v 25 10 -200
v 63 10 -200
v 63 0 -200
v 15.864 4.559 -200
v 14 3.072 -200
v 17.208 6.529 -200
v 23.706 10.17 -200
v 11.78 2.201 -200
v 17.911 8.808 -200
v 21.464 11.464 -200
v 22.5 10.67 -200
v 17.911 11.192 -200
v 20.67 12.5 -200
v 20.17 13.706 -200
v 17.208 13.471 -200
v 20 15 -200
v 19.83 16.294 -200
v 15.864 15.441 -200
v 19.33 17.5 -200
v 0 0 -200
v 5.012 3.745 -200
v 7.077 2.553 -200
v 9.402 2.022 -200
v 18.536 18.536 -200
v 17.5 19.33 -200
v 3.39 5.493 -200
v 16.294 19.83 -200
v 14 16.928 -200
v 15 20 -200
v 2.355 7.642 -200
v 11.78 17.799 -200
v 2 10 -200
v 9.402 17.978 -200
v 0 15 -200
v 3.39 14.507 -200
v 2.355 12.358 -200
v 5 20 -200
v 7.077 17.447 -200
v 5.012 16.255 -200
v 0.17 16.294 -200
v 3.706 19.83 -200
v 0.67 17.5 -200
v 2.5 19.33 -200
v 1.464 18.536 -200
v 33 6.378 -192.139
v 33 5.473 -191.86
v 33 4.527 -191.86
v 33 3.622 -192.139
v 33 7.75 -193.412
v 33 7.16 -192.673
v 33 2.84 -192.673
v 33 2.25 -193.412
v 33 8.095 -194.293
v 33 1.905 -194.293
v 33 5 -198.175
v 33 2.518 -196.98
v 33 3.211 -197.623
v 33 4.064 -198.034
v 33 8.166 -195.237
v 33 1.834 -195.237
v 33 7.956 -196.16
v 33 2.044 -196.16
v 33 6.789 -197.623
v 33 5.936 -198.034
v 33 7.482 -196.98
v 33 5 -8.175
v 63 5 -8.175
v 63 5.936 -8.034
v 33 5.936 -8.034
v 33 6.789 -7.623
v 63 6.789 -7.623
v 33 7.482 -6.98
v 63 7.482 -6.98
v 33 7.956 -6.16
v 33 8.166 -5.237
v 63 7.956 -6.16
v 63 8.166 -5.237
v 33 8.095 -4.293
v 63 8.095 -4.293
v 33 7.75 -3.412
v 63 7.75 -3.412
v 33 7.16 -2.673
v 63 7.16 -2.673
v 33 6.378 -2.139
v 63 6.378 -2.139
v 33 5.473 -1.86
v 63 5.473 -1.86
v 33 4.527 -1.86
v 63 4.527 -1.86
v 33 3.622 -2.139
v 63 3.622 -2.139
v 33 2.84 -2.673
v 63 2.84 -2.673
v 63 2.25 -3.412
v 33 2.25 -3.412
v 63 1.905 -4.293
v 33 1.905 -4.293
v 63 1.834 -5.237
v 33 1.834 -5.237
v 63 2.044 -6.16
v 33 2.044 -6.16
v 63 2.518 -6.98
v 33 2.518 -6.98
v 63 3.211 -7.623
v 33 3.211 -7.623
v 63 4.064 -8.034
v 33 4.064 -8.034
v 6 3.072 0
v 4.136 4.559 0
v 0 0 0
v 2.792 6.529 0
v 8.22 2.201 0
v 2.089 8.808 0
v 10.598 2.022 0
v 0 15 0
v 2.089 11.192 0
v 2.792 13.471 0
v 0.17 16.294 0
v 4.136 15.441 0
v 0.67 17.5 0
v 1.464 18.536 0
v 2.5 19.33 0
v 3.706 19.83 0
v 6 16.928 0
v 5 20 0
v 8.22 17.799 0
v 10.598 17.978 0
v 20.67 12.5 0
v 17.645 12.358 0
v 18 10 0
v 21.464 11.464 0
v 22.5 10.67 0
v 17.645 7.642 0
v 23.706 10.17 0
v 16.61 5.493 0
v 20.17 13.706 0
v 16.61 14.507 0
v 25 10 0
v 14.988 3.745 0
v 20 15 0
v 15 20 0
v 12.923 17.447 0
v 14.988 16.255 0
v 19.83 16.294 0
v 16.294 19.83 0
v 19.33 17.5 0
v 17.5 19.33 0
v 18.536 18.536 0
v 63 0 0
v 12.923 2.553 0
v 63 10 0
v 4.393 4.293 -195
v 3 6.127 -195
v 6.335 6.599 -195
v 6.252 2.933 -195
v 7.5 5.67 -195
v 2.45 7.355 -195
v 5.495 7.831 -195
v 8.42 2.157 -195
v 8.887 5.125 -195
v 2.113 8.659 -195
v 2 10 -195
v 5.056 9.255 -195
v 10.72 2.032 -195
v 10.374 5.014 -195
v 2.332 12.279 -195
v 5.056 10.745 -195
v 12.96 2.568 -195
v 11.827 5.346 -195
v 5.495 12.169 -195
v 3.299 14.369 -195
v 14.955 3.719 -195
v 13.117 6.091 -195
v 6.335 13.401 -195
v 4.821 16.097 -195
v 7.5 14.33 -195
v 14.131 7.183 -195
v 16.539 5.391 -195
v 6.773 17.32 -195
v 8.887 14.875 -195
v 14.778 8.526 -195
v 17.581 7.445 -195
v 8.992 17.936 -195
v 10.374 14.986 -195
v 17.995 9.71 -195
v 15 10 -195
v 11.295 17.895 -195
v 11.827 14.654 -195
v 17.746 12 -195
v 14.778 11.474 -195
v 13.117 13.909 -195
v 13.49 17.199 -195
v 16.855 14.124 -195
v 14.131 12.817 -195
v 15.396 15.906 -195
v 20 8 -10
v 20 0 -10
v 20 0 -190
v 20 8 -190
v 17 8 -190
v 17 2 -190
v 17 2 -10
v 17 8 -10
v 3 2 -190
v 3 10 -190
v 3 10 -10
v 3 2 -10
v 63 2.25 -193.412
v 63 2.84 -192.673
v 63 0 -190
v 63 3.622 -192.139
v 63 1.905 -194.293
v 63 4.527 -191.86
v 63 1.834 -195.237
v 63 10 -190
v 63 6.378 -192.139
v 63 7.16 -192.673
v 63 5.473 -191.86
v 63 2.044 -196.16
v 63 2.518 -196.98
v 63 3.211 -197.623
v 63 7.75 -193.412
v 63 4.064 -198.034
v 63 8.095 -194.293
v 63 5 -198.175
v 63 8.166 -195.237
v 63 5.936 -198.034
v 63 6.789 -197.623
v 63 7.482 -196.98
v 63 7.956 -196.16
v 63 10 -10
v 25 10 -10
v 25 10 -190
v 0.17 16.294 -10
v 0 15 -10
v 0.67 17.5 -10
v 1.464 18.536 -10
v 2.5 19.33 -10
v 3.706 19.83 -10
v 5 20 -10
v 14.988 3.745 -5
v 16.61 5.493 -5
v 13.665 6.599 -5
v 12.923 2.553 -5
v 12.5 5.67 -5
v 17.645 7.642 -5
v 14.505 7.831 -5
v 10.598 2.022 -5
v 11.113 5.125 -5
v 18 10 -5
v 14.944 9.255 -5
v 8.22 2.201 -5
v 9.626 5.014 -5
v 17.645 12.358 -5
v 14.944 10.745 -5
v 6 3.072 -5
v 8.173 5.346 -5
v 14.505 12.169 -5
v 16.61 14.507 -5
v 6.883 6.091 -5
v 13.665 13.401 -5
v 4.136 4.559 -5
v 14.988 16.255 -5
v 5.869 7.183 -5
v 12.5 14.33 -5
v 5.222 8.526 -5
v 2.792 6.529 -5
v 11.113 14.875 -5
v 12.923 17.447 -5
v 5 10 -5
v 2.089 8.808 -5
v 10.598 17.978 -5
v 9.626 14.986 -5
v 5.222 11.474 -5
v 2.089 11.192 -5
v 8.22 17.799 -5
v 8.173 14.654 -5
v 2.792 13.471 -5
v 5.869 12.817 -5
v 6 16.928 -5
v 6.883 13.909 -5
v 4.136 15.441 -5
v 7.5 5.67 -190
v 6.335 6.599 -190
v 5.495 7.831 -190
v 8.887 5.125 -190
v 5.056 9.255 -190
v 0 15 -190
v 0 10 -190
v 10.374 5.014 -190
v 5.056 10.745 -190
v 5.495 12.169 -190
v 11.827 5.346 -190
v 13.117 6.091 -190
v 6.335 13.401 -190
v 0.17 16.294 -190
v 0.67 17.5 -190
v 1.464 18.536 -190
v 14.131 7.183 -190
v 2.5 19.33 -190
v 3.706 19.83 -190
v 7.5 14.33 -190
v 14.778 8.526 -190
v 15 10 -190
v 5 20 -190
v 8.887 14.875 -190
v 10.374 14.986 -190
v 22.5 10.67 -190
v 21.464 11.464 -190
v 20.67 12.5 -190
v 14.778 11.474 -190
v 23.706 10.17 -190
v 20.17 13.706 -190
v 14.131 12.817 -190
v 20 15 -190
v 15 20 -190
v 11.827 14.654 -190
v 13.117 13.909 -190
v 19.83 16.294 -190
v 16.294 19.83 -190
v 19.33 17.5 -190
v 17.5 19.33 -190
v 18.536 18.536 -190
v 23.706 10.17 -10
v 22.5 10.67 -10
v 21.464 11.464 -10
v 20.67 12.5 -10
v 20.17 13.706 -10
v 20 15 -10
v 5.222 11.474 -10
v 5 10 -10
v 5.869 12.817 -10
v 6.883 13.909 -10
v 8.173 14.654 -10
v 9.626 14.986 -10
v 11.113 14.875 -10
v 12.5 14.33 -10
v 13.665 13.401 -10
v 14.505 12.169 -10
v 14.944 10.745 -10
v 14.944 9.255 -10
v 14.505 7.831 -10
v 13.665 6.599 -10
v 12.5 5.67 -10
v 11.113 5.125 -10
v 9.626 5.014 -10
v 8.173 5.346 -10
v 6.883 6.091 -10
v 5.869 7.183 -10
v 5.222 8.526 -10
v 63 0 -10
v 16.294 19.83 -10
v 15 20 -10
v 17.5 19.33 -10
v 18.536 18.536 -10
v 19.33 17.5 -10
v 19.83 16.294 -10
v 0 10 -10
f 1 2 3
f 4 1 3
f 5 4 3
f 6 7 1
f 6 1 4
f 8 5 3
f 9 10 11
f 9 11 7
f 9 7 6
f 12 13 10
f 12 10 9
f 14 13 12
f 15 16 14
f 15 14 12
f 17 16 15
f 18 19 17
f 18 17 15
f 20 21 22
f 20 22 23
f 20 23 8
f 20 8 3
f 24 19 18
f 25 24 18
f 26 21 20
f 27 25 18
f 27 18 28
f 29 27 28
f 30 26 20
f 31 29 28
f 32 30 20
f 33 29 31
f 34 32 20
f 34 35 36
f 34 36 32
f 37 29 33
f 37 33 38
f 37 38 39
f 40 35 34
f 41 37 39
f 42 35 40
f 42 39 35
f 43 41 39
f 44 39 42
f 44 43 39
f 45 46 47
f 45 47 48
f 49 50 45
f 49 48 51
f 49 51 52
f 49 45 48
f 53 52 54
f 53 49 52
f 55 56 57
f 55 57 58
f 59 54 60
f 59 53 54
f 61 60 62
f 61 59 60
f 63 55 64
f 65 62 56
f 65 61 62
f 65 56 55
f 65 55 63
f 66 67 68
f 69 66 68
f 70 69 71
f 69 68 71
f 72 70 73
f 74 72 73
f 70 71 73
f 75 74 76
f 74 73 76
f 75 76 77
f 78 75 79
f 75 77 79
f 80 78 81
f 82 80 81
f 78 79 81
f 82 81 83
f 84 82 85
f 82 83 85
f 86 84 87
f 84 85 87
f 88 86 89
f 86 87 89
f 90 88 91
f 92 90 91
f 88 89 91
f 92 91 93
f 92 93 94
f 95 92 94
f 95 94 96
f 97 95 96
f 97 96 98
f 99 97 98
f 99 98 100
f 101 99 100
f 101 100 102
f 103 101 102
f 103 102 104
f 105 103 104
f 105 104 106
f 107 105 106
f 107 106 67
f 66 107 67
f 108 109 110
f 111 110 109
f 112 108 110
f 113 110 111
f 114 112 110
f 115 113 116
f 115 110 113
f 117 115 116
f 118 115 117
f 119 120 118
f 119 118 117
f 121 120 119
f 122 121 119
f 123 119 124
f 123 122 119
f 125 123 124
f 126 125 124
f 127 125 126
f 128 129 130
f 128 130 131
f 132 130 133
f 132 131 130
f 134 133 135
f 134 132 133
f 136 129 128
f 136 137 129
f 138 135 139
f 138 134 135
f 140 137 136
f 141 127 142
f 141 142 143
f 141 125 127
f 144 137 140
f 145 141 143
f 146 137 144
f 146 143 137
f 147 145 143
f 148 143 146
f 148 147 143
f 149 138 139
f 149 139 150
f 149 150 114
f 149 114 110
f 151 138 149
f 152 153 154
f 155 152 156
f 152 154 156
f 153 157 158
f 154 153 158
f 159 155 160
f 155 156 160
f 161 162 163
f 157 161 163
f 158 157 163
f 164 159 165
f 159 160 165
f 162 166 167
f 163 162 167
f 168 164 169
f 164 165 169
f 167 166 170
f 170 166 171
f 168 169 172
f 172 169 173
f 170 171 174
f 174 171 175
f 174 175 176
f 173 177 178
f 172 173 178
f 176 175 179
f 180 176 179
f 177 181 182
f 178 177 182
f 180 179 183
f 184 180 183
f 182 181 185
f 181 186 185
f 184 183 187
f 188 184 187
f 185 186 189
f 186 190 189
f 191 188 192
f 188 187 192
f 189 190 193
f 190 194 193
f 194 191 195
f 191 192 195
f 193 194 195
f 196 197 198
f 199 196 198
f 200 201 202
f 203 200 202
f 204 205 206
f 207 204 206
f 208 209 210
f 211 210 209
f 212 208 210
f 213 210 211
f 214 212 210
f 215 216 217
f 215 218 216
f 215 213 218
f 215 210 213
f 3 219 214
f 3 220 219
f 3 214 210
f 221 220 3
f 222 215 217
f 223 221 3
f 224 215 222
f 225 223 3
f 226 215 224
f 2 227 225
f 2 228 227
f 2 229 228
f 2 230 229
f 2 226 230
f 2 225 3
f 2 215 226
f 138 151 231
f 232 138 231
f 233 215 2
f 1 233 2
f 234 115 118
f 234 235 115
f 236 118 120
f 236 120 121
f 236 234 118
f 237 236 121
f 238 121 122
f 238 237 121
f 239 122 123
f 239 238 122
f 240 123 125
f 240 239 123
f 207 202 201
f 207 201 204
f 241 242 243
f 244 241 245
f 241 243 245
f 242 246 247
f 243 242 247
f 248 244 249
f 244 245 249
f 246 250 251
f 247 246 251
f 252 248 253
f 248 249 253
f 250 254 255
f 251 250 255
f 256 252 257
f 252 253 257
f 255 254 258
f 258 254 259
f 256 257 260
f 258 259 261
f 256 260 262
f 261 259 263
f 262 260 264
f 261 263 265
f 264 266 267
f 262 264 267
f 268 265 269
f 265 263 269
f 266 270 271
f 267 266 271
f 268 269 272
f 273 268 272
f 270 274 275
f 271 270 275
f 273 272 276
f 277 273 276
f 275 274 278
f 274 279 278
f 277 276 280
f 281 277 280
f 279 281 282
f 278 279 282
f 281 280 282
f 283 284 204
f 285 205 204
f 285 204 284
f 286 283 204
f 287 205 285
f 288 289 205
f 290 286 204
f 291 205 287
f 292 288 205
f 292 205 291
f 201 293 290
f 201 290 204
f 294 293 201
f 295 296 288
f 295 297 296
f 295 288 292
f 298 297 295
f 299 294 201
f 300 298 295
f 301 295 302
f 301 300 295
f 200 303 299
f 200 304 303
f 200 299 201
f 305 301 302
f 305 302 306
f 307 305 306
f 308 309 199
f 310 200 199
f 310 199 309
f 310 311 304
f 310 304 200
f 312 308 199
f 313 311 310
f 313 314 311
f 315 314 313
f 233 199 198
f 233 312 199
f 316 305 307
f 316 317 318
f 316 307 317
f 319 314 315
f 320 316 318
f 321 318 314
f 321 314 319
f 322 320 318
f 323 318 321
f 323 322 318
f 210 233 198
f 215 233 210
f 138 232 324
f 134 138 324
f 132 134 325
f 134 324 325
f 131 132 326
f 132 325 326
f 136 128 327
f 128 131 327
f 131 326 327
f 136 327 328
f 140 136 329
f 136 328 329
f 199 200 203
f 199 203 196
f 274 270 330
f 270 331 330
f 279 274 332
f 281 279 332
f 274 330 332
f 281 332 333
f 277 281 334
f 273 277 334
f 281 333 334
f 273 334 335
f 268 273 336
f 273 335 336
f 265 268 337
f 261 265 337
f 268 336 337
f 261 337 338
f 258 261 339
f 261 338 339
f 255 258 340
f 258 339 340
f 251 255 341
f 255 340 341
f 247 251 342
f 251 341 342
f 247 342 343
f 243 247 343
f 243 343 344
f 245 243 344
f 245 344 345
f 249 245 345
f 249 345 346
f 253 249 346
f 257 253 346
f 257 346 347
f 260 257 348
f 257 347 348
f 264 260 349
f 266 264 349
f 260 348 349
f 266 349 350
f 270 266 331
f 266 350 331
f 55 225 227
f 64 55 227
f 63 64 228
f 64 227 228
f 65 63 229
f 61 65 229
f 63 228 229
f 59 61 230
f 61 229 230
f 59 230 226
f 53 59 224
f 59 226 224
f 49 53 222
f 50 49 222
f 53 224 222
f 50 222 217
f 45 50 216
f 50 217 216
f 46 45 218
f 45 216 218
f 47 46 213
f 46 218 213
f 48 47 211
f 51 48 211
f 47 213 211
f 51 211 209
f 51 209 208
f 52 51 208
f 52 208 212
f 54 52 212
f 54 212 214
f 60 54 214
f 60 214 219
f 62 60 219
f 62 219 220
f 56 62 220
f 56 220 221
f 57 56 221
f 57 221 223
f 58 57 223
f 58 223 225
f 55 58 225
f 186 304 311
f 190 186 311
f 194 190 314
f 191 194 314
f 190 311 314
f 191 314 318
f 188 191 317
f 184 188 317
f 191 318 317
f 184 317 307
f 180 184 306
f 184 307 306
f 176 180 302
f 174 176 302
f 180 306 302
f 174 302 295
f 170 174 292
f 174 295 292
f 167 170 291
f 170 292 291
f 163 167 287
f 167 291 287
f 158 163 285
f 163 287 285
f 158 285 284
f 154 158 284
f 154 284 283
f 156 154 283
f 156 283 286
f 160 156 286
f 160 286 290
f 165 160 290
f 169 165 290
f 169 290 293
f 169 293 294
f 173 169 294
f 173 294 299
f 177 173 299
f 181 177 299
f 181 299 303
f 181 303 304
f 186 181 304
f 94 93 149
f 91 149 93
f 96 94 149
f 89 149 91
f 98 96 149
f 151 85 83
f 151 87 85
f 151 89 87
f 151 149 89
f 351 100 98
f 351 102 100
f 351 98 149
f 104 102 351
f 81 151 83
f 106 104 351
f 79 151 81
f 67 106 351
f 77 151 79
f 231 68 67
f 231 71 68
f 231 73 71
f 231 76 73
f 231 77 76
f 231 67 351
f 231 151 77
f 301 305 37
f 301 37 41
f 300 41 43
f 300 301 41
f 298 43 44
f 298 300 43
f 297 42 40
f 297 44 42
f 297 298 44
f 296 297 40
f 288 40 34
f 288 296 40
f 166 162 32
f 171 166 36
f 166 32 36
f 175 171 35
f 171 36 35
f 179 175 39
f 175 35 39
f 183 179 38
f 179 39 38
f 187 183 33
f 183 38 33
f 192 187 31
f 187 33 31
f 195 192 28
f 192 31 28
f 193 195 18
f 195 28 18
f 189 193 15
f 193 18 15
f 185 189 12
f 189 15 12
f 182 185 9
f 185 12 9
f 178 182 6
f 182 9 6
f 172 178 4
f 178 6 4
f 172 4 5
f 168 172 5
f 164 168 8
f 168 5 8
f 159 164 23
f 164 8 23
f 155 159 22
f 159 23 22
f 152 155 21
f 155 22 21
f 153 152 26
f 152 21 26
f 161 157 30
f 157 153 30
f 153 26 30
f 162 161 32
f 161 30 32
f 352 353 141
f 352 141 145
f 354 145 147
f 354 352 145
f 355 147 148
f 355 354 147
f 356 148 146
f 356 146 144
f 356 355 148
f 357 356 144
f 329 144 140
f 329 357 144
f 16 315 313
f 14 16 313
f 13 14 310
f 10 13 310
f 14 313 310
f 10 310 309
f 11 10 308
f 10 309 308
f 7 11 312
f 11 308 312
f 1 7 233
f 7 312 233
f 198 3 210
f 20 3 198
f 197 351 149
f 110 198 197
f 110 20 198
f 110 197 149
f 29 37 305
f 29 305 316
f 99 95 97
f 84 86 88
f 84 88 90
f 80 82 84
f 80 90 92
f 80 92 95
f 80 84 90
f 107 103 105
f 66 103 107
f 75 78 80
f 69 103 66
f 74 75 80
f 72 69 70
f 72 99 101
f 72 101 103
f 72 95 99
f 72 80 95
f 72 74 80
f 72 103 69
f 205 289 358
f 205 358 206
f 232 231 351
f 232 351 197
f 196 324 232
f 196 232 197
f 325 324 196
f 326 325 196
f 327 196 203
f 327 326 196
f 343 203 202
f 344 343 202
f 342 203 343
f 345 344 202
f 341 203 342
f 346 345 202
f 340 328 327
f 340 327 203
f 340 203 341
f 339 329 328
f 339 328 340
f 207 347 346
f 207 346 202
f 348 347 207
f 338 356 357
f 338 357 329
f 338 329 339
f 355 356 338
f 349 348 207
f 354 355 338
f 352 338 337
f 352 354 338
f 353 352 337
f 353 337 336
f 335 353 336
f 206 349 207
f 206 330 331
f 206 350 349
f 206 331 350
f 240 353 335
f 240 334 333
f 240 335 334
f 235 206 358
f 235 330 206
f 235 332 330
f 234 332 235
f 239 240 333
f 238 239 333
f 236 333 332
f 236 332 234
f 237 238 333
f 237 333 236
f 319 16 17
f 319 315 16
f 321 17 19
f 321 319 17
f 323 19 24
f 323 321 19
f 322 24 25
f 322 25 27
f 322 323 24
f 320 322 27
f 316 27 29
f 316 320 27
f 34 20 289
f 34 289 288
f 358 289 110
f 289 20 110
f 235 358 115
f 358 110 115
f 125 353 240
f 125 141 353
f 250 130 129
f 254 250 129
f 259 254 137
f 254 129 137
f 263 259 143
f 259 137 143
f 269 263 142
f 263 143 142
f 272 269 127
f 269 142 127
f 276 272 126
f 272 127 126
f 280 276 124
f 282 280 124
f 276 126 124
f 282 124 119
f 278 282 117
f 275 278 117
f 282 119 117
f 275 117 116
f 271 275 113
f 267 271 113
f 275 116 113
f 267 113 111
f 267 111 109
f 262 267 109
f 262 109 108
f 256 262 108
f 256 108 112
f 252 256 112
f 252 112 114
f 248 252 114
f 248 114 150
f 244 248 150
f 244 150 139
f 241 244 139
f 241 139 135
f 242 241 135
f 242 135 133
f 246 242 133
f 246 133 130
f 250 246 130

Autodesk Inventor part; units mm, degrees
ref_plane "YZ Plane" through (0, 0, 0) normal (1, 0, 0) x (0, 1, 0)
ref_plane "XZ Plane" through (0, 0, 0) normal (0, 1, 0) x (-1, 0, 0)
ref_plane "XY Plane" through (0, 0, 0) normal (0, 0, 1) x (1, 0, 0)
sketch "Sketch1" plane through (0, 0, 0) normal (1, 0, 0) x (0, 1, 0)
  line L0 (0, 0) -> (10, 0)
  line L1 (10, 0) -> (10, -200)
  line L2 (10, -200) -> (0, -200)
  line L3 (0, -200) -> (0, 0)
  dimension "d0" = 10
  dimension "d1" = 200
extrude "Extrusion1" add sketch "Sketch1" along normal blind 3
sketch "Sketch2" plane through (3, 0, 0) normal (1, 0, 0) x (0, 0, -1)
  line L0 (0, 10) -> (0, 0) projected
  line L1 (0, 0) -> (200, 0) projected
  line L2 (0, 10) -> (10, 10)
  line L3 (10, 10) -> (10, 0)
  line L4 (10, 0) -> (0, 0)
  line L5 (0, 0) -> (0, 10)
  line L6 (200, 0) -> (200, 10) projected
  line L7 (200, 10) -> (190, 10)
  line L8 (190, 10) -> (190, 0)
  line L9 (190, 0) -> (200, 0)
  line L10 (200, 0) -> (200, 10)
  dimension "d4" = 10
  dimension "d5" = 10
extrude "Extrusion2" add sketch "Sketch2" along normal blind 60
sketch "Sketch3" plane through (63, 0, 0) normal (1, 0, 0) x (0, 0, -1)
  line L0 (0, 10) -> (200, 10) construction
  line L1 (10, 0) -> (190, 0) construction
  line L2 (0, 10) -> (10, 0) construction
  line L3 (5, 5) -> (0, 5) construction
  line L4 (0, 0) -> (0, 10) construction
  circle A0 centre (5, 5) radius 3.175
  line L5 (200, 10) -> (190, 10) construction
  line L6 (200, 0) -> (200, 10) construction
  line L7 (190, 10) -> (200, 0) construction
  circle A1 centre (195, 5) radius 3.175
  dimension "d8" = 6.35
  dimension "d9" = 6.35
extrude "Extrusion3" cut sketch "Sketch3" against normal blind 30
sketch "Sketch4" plane through (0, 0, -200) normal (0, 0, -1) x (-1, 0, 0)
  line L0 (0, 0) -> (-63, 0) construction
  line L1 (0, 0) -> (-20, 0) construction
  line L2 (-20, 0) -> (-20, 20) construction
  line L3 (-20, 20) -> (0, 20) construction
  line L4 (0, 20) -> (0, 0) construction
  line L5 (-3, 10) -> (-63, 10) construction
  circle A0 centre (-10, 10) radius 8 construction
  line L6 (0, 10) -> (-63, 10) projected
  arc A1 (-2, 10) -> (-18, 10) centre (-10, 10) ccw
  line L7 (-20, 10) -> (-18, 10)
  line L8 (-2, 10) -> (0, 10)
  line L9 (0, 20) -> (-20, 20)
  line L10 (-20, 10) -> (-20, 20)
  line L11 (0, 20) -> (0, 10)
  dimension "d12" = 20
  dimension "d13" = 20
  dimension "d14" = 16
extrude "Extrusion4" add sketch "Sketch4" against normal blind 10 contours L6 A1 L10 L9 L11
fillet "Fillet1" radius 5 2 edges at (0, 20, -195) (20, 20, -195)
fillet "Fillet2" radius 5 1 edges at (20, 10, -195)
sketch "Sketch5" plane through (63, 0, -200) normal (0, 0, -1) x (-1, 0, 0)
  arc A0 (61, 10) -> (45, 10) centre (53, 10) ccw projected
  circle A1 centre (53, 10) radius 8
  point P0 (63, 0)
extrude "Extrusion5" cut sketch "Sketch5" against normal blind 200
sketch "Sketch6" plane through (3, 0, -190) normal (0, 0, 1) x (1, 0, 0)
  arc A0 (0, 6.127) -> (-1, 10) centre (7, 10) ccw projected
  circle A1 centre (7, 10) radius 8
  circle A2 centre (7, 10) radius 5
  point P0 (-3, 0)
  dimension "d21" = 10
extrude "Extrusion6" add sketch "Sketch6" against normal blind 5
sketch "Sketch7" plane through (0, 0, 0) normal (0, 0, 1) x (1, 0, 0)
  line L0 (0, 0) -> (63, 0) construction
  line L1 (0, 0) -> (20, 0) construction
  line L2 (20, 0) -> (20, 20) construction
  line L3 (20, 20) -> (0, 20) construction
  line L4 (0, 20) -> (0, 0) construction
  circle A0 centre (10, 10) radius 8 construction
  line L5 (2, 10) -> (0, 10) projected
  line L6 (2, 10) -> (0, 10)
  line L7 (0, 10) -> (0, 20)
  line L8 (20, 20) -> (0, 20)
  line L9 (20, 20) -> (20, 10)
  line L10 (18, 10) -> (63, 10) projected
  line L11 (18, 10) -> (20, 10)
  arc A1 (18, 10) -> (2, 10) centre (10, 10) ccw
  dimension "d24" = 20
  dimension "d25" = 20
  dimension "d26" = 16
extrude "Extrusion7" add sketch "Sketch7" against normal blind 10
fillet "Fillet3" radius 5 3 edges at (0, 20, -5) (20, 20, -5) (20, 10, -5)
sketch "Sketch8" plane through (63, 0, -10) normal (0, 0, -1) x (-1, 0, 0)
  circle A0 centre (53, 10) radius 5 projected
  circle A1 centre (53, 10) radius 5
  circle A2 centre (53, 10) radius 8
  point P0 (63, 0)
extrude "Extrusion8" add sketch "Sketch8" against normal blind 5
sketch "Sketch9" plane through (63, 0, -10) normal (0, 0, -1) x (-1, 0, 0)
  line L0 (63, 0) -> (43, 0)
  line L1 (43, 0) -> (43, 2)
  line L2 (43, 2) -> (63, 2)
  line L3 (63, 2) -> (63, 0)
  dimension "d32" = 20
  dimension "d33" = 2
extrude "Extrusion9" add sketch "Sketch9" along normal blind 190
sketch "Sketch10" plane through (3, 2, -10) normal (0, 1, 0) x (1, 0, 0)
  line L0 (17, 180) -> (14, 180)
  line L1 (14, 180) -> (14, 0)
  line L2 (14, 0) -> (17, 0)
  line L3 (17, 0) -> (17, 180)
  point P0 (-3, -10)
  dimension "d36" = 3
sketch "Sketch11" plane through (0, 10, -10) normal (0, 1, 0) x (1, 0, 0)
  line L0 (3, 180) -> (3, 0) projected
  line L1 (0, 180.0445) -> (3, 180.0445)
  line L2 (3, 180.0445) -> (3, 0)
  line L3 (3, 0) -> (0, 0)
  line L4 (0, 0) -> (0, 180.0445)
  point P0 (0, -10)
extrude "Extrusion10" add sketch "Sketch11" against normal blind 10
extrude "Extrusion11" add sketch "Sketch10" along normal blind 6
properties part number "rearAxelHolder 6-5"
